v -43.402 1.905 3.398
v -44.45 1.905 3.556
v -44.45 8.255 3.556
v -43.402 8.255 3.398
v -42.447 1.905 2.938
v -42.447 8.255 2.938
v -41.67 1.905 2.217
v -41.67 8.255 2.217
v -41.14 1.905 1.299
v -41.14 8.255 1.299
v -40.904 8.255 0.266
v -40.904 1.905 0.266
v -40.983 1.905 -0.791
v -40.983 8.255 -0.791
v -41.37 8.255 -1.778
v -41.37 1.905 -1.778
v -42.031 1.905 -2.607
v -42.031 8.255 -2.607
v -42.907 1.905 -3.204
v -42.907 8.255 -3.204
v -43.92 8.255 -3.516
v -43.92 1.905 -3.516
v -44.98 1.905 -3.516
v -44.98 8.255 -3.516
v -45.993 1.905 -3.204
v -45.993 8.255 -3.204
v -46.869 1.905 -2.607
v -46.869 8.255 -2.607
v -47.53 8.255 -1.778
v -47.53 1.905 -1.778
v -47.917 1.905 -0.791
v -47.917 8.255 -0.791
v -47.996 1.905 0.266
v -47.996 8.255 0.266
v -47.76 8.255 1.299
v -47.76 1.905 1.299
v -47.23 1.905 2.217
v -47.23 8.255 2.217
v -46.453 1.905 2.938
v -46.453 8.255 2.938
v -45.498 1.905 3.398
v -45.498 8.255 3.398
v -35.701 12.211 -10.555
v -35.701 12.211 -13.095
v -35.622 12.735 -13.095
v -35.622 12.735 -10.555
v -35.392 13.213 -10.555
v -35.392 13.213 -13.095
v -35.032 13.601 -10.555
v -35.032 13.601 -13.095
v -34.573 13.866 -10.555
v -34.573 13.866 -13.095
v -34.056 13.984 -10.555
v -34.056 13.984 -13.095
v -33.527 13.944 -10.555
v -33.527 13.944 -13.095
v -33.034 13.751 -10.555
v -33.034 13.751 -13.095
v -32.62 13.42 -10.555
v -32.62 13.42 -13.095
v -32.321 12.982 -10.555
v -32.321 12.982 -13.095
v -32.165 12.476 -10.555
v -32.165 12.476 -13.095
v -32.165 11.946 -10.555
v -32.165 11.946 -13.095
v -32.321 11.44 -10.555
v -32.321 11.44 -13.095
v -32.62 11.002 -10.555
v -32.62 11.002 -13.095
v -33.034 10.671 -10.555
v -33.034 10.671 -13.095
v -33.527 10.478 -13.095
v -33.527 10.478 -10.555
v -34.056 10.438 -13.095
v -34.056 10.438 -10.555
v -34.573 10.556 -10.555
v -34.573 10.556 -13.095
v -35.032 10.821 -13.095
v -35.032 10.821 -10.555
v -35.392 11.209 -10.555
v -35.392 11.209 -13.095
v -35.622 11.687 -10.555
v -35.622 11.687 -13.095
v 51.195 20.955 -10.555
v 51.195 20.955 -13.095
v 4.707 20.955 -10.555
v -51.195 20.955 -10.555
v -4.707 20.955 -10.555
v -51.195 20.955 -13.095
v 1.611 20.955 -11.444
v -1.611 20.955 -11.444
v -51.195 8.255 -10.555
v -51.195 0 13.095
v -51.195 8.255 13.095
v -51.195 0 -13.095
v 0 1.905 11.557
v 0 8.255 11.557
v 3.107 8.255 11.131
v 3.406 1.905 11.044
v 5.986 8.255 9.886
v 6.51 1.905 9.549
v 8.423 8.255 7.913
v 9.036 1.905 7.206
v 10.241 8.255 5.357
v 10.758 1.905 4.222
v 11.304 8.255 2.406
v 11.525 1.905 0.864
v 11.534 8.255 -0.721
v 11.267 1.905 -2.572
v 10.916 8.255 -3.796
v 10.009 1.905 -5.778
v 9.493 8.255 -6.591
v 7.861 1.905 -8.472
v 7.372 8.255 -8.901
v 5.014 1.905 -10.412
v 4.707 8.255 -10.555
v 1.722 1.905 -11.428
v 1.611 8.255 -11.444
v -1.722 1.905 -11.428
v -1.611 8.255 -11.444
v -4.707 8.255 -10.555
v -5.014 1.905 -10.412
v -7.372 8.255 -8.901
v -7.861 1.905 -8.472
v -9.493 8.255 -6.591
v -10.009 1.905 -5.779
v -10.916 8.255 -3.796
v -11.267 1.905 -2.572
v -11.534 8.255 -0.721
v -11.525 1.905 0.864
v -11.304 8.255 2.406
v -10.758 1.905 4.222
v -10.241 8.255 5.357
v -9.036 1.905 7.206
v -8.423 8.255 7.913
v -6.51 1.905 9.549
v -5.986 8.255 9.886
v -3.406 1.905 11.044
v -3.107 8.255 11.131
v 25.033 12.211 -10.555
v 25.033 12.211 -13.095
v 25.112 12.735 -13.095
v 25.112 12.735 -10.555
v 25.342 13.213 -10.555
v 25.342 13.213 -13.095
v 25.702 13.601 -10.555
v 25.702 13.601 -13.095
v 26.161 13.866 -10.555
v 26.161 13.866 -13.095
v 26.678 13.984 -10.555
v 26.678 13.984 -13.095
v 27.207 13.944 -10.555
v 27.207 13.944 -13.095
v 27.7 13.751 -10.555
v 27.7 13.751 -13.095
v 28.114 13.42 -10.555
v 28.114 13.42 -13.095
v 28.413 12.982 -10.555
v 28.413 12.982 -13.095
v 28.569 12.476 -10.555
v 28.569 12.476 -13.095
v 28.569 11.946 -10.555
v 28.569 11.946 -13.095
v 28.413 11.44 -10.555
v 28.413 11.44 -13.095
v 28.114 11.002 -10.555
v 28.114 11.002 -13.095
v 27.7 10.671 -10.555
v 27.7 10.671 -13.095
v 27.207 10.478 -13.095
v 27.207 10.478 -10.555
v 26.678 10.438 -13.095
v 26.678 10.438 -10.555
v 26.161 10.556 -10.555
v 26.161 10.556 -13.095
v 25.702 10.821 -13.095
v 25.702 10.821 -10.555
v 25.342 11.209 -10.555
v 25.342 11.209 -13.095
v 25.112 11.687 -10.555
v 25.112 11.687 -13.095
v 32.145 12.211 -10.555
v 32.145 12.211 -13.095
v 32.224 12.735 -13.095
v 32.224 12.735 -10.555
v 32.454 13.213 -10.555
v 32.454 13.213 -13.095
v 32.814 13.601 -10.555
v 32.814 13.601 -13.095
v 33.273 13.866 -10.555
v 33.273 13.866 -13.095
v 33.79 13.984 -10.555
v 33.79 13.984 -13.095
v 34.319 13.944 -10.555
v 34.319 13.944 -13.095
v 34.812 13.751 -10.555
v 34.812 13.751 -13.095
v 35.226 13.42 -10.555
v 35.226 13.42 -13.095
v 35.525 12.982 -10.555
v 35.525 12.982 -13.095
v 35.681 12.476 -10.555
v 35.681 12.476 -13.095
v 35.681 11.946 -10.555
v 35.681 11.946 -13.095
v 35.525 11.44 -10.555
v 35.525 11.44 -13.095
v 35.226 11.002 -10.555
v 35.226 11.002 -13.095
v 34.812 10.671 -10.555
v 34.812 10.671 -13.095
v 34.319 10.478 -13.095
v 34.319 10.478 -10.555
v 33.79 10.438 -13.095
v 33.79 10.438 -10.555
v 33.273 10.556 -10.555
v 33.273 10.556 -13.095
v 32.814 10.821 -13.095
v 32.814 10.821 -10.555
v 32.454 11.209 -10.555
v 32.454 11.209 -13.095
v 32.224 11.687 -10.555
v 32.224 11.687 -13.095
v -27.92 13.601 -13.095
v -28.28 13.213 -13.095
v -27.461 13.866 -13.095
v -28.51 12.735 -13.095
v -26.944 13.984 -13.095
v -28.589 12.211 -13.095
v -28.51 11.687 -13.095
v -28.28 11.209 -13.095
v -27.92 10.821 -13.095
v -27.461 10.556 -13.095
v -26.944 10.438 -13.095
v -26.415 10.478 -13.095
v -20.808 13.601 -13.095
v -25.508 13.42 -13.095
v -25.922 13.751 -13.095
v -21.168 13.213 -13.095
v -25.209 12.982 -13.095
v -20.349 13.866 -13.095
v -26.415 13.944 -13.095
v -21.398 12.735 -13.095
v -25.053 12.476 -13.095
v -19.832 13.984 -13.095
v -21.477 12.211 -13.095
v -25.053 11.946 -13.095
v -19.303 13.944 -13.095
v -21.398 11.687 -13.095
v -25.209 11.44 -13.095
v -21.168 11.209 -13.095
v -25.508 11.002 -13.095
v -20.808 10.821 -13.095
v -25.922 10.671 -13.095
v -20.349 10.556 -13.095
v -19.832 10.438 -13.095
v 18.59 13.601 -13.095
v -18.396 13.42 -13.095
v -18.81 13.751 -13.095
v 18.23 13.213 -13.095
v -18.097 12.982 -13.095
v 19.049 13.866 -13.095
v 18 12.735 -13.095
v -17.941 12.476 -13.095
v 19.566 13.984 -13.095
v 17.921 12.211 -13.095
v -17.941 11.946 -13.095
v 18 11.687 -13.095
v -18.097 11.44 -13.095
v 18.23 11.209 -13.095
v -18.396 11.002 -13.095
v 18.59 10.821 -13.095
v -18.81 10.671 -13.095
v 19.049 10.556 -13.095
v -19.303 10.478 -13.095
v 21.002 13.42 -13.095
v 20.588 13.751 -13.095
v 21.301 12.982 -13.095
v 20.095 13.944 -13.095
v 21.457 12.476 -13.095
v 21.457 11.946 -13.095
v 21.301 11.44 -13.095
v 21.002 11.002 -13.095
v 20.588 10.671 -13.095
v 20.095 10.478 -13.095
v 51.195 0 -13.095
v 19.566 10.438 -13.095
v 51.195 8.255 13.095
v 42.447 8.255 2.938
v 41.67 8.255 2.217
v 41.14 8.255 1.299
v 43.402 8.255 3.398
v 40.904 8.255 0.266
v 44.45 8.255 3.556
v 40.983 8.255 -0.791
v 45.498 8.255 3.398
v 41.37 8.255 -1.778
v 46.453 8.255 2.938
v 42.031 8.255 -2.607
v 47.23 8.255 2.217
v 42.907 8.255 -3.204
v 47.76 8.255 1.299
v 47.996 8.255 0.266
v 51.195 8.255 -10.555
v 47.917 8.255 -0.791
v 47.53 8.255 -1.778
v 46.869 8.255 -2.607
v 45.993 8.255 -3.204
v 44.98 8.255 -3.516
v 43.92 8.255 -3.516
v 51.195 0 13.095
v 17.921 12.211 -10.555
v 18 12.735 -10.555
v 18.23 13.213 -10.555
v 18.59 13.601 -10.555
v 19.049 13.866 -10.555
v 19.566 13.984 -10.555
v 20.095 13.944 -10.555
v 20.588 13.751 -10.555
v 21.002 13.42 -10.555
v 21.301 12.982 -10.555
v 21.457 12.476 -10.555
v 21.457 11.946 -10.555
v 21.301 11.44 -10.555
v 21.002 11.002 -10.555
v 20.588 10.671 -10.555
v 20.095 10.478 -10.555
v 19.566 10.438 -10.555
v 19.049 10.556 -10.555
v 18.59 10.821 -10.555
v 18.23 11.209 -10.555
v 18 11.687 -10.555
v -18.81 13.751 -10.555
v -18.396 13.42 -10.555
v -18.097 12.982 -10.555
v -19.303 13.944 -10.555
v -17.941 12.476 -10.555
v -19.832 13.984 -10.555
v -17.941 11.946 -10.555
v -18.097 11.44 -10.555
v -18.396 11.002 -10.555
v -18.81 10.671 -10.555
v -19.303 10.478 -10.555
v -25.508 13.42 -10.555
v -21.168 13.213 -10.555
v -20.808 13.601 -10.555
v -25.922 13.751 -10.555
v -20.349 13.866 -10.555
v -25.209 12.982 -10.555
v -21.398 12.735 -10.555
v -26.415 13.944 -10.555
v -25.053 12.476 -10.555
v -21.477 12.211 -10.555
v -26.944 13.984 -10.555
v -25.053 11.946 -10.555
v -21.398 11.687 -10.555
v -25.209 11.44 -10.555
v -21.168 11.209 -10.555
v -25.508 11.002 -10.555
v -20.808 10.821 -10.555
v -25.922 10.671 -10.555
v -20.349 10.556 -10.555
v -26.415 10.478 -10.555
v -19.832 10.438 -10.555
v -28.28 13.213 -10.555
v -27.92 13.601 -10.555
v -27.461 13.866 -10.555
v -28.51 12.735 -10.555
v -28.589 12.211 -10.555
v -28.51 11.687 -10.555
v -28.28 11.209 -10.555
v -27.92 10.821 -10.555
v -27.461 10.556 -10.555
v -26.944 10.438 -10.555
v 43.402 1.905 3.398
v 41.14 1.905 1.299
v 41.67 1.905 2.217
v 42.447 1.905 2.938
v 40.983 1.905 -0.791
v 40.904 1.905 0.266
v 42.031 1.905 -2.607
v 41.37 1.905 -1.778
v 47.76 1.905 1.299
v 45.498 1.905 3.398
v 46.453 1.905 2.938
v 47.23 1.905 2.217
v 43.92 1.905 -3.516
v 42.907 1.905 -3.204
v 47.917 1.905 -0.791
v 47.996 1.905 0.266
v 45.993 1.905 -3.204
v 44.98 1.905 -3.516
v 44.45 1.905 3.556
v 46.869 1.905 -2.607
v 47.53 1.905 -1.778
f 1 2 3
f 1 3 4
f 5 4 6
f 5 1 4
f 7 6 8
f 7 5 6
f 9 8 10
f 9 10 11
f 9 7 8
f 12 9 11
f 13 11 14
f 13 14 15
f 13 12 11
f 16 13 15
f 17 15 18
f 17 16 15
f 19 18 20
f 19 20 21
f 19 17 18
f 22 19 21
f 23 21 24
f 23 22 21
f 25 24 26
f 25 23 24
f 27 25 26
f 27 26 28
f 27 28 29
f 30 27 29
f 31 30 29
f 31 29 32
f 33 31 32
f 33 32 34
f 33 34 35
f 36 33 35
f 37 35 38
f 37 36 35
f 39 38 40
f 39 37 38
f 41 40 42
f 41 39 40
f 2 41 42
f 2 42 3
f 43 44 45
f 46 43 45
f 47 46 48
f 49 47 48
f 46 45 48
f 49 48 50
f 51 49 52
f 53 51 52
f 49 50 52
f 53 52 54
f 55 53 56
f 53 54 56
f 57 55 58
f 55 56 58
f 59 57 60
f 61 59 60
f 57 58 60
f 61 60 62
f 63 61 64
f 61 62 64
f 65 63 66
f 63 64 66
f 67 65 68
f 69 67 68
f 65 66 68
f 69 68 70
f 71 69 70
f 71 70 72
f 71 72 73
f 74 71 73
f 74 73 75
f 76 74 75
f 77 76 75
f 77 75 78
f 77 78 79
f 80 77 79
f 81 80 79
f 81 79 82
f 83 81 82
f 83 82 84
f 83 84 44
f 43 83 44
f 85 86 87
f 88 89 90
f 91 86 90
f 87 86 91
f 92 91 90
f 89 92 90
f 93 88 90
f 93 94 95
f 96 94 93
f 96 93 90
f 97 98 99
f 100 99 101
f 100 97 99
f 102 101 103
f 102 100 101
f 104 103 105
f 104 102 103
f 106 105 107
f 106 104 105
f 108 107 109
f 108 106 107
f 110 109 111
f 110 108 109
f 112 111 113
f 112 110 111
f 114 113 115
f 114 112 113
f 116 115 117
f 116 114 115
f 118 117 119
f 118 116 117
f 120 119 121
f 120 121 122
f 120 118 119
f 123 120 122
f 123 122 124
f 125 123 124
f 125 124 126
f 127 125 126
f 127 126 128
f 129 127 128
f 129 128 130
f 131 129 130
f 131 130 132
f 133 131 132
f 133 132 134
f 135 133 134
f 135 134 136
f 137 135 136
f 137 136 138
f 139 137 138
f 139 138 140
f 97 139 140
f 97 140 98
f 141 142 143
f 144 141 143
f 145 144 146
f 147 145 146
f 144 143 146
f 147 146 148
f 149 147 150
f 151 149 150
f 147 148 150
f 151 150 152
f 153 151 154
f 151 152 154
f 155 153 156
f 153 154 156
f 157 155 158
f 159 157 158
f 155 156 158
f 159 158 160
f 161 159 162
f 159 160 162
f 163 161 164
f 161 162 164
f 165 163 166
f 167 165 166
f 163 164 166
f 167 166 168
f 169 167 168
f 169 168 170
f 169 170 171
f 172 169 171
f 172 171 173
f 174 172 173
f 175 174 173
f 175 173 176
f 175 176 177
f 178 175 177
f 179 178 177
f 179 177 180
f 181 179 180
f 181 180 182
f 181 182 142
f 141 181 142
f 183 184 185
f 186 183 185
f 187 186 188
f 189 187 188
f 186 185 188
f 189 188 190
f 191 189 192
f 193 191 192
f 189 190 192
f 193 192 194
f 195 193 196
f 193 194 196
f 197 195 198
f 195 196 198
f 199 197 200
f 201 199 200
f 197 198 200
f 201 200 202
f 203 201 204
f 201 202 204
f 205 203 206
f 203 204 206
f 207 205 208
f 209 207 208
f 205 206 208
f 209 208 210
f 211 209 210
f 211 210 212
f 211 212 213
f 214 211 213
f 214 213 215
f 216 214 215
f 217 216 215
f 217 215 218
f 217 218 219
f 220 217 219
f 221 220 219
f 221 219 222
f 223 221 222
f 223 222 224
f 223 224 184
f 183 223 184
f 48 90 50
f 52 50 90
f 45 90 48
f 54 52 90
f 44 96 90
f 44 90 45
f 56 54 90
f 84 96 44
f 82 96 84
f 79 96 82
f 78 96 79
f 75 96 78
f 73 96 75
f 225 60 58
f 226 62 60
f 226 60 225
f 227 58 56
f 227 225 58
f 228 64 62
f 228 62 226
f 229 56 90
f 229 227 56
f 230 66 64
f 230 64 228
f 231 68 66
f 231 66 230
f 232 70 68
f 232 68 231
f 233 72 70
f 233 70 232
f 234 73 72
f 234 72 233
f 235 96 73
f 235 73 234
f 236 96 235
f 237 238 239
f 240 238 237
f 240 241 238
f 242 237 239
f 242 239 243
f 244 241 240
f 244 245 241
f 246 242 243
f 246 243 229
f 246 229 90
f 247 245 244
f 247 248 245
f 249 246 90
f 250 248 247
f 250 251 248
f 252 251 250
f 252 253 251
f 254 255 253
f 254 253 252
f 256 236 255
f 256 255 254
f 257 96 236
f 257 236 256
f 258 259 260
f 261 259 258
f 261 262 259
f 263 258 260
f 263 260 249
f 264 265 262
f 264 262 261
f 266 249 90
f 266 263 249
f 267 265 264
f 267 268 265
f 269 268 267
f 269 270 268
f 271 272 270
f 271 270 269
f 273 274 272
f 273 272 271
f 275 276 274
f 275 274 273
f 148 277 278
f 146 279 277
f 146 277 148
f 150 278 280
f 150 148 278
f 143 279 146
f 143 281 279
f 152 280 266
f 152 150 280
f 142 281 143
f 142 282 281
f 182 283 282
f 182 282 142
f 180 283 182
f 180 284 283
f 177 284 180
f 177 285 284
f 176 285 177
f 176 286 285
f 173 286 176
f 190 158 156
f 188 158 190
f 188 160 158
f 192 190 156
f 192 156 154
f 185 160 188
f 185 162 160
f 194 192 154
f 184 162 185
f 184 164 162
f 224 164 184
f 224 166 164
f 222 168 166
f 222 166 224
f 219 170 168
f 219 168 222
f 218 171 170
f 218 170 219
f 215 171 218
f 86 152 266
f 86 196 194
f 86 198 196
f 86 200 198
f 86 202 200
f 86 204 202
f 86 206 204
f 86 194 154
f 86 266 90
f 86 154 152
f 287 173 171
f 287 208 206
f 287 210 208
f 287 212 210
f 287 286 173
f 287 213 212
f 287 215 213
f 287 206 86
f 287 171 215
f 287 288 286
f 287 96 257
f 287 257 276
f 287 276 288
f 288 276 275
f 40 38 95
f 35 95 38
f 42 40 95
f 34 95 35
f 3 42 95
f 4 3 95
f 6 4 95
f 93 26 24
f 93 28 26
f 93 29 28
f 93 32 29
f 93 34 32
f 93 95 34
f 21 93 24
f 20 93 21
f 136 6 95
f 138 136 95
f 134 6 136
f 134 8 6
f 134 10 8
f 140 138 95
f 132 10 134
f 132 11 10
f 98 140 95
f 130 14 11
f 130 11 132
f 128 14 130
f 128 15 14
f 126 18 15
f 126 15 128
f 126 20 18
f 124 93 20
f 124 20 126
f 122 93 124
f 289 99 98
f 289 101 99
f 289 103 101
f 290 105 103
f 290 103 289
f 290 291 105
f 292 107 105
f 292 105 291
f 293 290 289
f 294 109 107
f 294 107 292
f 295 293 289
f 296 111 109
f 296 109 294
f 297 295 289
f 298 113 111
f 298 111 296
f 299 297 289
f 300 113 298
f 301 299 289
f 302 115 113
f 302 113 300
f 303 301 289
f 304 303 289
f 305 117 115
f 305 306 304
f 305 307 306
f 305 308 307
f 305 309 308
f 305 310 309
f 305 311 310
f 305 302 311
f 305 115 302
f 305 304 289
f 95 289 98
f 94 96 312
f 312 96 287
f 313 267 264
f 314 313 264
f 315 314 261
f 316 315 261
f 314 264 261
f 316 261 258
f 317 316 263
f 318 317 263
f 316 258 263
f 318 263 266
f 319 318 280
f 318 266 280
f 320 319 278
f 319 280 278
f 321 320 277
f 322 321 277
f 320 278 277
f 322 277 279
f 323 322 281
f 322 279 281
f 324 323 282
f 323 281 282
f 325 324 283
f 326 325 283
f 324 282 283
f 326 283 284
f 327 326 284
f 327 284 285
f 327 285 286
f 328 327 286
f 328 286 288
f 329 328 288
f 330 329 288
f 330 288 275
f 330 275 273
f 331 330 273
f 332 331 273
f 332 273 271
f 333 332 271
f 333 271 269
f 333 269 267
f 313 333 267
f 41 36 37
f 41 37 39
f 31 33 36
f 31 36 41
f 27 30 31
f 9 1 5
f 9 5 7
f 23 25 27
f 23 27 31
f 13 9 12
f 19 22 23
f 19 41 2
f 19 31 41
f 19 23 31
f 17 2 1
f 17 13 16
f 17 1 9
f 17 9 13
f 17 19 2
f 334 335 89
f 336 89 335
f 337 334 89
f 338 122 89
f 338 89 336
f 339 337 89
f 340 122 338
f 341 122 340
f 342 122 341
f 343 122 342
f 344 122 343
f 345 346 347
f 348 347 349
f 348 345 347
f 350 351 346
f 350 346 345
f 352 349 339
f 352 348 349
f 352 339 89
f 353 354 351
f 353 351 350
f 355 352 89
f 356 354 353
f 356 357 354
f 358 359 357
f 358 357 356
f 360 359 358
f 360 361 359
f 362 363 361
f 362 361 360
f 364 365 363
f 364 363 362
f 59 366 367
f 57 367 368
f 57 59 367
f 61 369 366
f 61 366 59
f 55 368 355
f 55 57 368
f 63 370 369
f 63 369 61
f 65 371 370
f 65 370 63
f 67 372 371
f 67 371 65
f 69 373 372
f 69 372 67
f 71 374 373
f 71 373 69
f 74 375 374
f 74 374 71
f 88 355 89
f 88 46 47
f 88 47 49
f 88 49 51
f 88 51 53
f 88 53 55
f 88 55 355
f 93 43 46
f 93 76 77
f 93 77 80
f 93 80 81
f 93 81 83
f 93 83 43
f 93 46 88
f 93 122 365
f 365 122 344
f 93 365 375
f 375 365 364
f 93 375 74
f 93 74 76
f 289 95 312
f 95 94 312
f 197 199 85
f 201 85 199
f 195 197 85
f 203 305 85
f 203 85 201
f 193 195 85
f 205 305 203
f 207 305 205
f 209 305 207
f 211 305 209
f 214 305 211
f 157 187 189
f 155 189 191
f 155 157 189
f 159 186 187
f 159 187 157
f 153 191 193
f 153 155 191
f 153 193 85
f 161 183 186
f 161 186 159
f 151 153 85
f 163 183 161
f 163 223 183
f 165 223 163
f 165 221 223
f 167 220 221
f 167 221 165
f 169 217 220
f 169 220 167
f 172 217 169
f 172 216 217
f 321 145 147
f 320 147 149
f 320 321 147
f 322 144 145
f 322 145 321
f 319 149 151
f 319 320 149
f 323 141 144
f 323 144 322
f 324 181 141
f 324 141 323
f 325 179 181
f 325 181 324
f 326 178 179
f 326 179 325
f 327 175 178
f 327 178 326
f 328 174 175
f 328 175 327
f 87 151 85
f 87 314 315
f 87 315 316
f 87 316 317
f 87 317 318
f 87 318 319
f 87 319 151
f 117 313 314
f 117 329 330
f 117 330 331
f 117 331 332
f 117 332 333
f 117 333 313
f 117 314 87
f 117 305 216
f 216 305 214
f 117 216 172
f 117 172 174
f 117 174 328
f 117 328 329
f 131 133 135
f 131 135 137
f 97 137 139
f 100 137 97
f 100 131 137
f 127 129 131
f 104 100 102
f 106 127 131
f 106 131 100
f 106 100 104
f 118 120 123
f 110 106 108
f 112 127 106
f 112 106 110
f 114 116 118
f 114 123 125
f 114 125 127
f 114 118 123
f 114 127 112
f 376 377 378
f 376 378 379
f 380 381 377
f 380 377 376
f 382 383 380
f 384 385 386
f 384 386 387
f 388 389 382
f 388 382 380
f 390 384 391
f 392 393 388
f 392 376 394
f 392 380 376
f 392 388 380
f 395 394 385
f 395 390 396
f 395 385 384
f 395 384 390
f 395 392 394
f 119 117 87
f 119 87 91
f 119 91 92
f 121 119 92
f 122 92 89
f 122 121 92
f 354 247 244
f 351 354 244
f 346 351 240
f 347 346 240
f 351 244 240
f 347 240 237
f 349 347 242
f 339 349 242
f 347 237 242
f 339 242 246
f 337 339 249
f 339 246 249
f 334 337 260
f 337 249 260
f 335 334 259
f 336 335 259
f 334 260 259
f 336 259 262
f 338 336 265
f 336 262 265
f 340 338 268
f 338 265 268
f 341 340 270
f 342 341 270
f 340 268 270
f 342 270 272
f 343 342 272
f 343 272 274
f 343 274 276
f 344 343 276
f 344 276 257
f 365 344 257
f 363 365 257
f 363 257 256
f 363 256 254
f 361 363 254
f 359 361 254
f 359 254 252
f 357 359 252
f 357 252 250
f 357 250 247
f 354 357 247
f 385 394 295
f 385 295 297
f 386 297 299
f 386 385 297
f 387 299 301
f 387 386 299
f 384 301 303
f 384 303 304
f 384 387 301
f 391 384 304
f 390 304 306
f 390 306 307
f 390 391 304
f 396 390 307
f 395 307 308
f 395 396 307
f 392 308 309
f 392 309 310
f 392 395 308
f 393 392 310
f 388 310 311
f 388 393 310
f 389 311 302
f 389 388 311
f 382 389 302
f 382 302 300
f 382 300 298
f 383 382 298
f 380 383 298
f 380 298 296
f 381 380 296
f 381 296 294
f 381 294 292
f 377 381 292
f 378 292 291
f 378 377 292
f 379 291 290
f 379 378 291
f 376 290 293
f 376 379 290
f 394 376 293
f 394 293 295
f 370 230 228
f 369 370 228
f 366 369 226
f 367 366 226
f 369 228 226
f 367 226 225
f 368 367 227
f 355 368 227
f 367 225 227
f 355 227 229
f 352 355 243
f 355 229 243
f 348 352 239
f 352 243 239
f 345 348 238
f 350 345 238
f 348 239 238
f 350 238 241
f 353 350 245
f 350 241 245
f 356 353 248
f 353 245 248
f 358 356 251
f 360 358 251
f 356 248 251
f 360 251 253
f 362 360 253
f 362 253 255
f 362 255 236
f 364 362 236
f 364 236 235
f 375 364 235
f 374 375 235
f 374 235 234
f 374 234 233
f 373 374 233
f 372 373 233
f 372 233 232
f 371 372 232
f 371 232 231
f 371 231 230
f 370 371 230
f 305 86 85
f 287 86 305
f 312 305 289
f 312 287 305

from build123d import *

# Parameters (mm, degrees)
SKETCH1_W           = 102.39
SKETCH1_H           = 26.19
BOSS_EXTRUDE1_DEPTH = 1.905
SKETCH2_W           = 102.39
SKETCH2_H           = 26.19
SKETCH2_R           = 11.557
SKETCH2_R_2         = 3.556
BOSS_EXTRUDE3_DEPTH = 6.35
BOSS_EXTRUDE4_DEPTH = 12.7
CUT_EXTRUDE1_REACH  = 63.204
SKETCH4_R           = 1.778


with BuildPart() as part:
    # Sketch1 → Boss-Extrude1 (new body)
    with BuildSketch(Plane(origin=(0, 0, 0), x_dir=(1, 0, 0), z_dir=(0, 1, 0))):
        Rectangle(SKETCH1_W, SKETCH1_H)
    extrude(amount=BOSS_EXTRUDE1_DEPTH)

    # Sketch2 → Boss-Extrude3 (add)
    with BuildSketch(Plane(origin=(0, 1.905, 0), x_dir=(1, 0, 0), z_dir=(0, 1, 0))):
        Rectangle(SKETCH2_W, SKETCH2_H)
        with Locations(Location((0, 0, 0), (0, 0, 270))):
            Circle(SKETCH2_R, mode=Mode.SUBTRACT)
        with Locations(Location((-44.45, 0, 0), (0, 0, 270))):
            Circle(SKETCH2_R_2, mode=Mode.SUBTRACT)
        with Locations(Location((44.45, 0, 0), (0, 0, 270))):
            Circle(SKETCH2_R_2, mode=Mode.SUBTRACT)
    extrude(amount=BOSS_EXTRUDE3_DEPTH)

    # Sketch3 → Boss-Extrude4 (add)
    with BuildSketch(Plane(origin=(0, 8.255, 0), x_dir=(1, 0, 0), z_dir=(0, 1, 0))):
        with BuildLine():
            Line((-51.195, 13.095), (51.195, 13.095))
            Line((51.195, 13.095), (51.195, 10.555))
            Line((51.195, 10.555), (4.707039834, 10.555))
            ThreePointArc((4.707039834, 10.555), (0, 11.557), (-4.707039834, 10.555))
            Line((-4.707039834, 10.555), (-51.195, 10.555))
            Line((-51.195, 10.555), (-51.195, 13.095))
        make_face()
    extrude(amount=BOSS_EXTRUDE4_DEPTH)

    # Sketch4 → Cut-Extrude1 (cut, up to next)
    with BuildSketch(Plane(origin=(0, 0, -13.095), x_dir=(-1, 0, 0), z_dir=(0, 0, -1)), mode=Mode.PRIVATE) as cut_extrude1_sk1:
        with Locations((33.923, 12.211)):
            Circle(SKETCH4_R)
    cut_extrude1_tool1 = extrude(cut_extrude1_sk1.sketch, amount=-CUT_EXTRUDE1_REACH, mode=Mode.PRIVATE) & part.part
    # Sketch4 → Cut-Extrude1 (cut, up to next)
    with BuildSketch(Plane(origin=(0, 0, -13.095), x_dir=(-1, 0, 0), z_dir=(0, 0, -1)), mode=Mode.PRIVATE) as cut_extrude1_sk2:
        with Locations((26.811, 12.211)):
            Circle(SKETCH4_R)
    cut_extrude1_tool2 = extrude(cut_extrude1_sk2.sketch, amount=-CUT_EXTRUDE1_REACH, mode=Mode.PRIVATE) & part.part
    # Sketch4 → Cut-Extrude1 (cut, up to next)
    with BuildSketch(Plane(origin=(0, 0, -13.095), x_dir=(-1, 0, 0), z_dir=(0, 0, -1)), mode=Mode.PRIVATE) as cut_extrude1_sk3:
        with Locations((19.699, 12.211)):
            Circle(SKETCH4_R)
    cut_extrude1_tool3 = extrude(cut_extrude1_sk3.sketch, amount=-CUT_EXTRUDE1_REACH, mode=Mode.PRIVATE) & part.part
    # Sketch4 → Cut-Extrude1 (cut, up to next)
    with BuildSketch(Plane(origin=(0, 0, -13.095), x_dir=(-1, 0, 0), z_dir=(0, 0, -1)), mode=Mode.PRIVATE) as cut_extrude1_sk4:
        with Locations((-33.923, 12.211)):
            Circle(SKETCH4_R)
    cut_extrude1_tool4 = extrude(cut_extrude1_sk4.sketch, amount=-CUT_EXTRUDE1_REACH, mode=Mode.PRIVATE) & part.part
    # Sketch4 → Cut-Extrude1 (cut, up to next)
    with BuildSketch(Plane(origin=(0, 0, -13.095), x_dir=(-1, 0, 0), z_dir=(0, 0, -1)), mode=Mode.PRIVATE) as cut_extrude1_sk5:
        with Locations((-26.811, 12.211)):
            Circle(SKETCH4_R)
    cut_extrude1_tool5 = extrude(cut_extrude1_sk5.sketch, amount=-CUT_EXTRUDE1_REACH, mode=Mode.PRIVATE) & part.part
    # Sketch4 → Cut-Extrude1 (cut, up to next)
    with BuildSketch(Plane(origin=(0, 0, -13.095), x_dir=(-1, 0, 0), z_dir=(0, 0, -1)), mode=Mode.PRIVATE) as cut_extrude1_sk6:
        with Locations((-19.699, 12.211)):
            Circle(SKETCH4_R)
    cut_extrude1_tool6 = extrude(cut_extrude1_sk6.sketch, amount=-CUT_EXTRUDE1_REACH, mode=Mode.PRIVATE) & part.part
    add(cut_extrude1_tool1.solids().sort_by_distance((-33.923, 12.211, -13.095))[0], mode=Mode.SUBTRACT)
    add(cut_extrude1_tool2.solids().sort_by_distance((-26.811, 12.211, -13.095))[0], mode=Mode.SUBTRACT)
    add(cut_extrude1_tool3.solids().sort_by_distance((-19.699, 12.211, -13.095))[0], mode=Mode.SUBTRACT)
    add(cut_extrude1_tool4.solids().sort_by_distance((33.923, 12.211, -13.095))[0], mode=Mode.SUBTRACT)
    add(cut_extrude1_tool5.solids().sort_by_distance((26.811, 12.211, -13.095))[0], mode=Mode.SUBTRACT)
    add(cut_extrude1_tool6.solids().sort_by_distance((19.699, 12.211, -13.095))[0], mode=Mode.SUBTRACT)


solid = part.part
